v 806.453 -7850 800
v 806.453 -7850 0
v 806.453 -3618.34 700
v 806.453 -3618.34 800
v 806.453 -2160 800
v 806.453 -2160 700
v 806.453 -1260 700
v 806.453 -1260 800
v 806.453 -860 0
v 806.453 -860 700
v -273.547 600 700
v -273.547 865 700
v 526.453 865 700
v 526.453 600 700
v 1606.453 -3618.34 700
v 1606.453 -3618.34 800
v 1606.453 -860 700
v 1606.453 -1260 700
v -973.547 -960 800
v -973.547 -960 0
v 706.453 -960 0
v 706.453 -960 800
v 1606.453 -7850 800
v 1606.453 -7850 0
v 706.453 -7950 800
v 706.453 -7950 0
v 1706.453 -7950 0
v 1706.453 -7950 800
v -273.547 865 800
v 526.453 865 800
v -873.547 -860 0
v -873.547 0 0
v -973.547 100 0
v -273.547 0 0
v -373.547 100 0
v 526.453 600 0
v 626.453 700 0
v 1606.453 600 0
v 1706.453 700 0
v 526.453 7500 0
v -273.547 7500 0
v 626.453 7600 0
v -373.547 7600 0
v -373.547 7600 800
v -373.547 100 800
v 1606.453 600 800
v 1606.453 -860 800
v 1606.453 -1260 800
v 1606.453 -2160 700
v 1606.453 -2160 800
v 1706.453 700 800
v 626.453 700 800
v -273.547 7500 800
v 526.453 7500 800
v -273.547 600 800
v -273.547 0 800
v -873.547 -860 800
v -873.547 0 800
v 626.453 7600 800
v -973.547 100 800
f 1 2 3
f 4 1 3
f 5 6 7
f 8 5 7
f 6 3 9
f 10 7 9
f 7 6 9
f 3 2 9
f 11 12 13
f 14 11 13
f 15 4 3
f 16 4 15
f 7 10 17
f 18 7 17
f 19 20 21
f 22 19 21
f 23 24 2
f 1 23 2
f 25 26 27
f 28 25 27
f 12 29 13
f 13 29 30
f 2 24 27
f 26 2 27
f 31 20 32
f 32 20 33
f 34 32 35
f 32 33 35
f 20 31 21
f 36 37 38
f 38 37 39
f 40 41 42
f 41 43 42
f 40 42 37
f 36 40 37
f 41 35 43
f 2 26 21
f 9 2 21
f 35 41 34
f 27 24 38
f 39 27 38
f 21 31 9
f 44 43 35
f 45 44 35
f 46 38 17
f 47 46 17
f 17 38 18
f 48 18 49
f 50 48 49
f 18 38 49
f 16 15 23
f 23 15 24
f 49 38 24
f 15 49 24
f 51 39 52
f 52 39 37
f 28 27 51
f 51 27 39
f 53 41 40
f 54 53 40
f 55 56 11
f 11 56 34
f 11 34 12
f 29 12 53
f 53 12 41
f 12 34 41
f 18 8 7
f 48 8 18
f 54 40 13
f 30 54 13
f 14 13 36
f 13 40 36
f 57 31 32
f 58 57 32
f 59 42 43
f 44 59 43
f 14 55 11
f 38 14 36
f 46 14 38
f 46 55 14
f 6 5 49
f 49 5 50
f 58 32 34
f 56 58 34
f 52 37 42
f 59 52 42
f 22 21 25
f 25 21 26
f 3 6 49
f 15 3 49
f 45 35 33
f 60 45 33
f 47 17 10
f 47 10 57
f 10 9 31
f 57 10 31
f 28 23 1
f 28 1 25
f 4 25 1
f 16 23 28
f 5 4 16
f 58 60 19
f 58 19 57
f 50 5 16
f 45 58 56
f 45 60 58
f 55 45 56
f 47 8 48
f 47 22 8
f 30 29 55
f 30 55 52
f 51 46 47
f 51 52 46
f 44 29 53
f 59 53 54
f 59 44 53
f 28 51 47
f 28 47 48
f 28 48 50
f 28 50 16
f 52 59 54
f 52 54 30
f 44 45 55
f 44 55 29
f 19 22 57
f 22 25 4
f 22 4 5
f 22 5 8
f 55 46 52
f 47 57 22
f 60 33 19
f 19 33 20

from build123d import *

# Parameters (mm, degrees)
SALIENTE_EXTRUIR1_DEPTH = 800
CROQUIS2_W              = 800
CROQUIS2_H              = 400
SALIENTE_EXTRUIR2_DEPTH = 100
CROQUIS3_W              = 800
CROQUIS3_H              = 1458.339782358
SALIENTE_EXTRUIR3_DEPTH = 100
CROQUIS4_W              = 800
CROQUIS4_H              = 265
SALIENTE_EXTRUIR4_DEPTH = 100


with BuildPart() as part:
    # Croquis1 → Saliente-Extruir1 (new body)
    with BuildSketch(Plane.XY):
        Polygon((1606.453179542, -7950), (1706.453179542, -7950), (1706.453179542, 99.648210299), (1706.453179542, 499.648210299), (1706.453179542, 599.648210299), (1706.453179542, 700), (626.453179542, 700), (626.453179542, 7600), (-373.546820458, 7600), (-373.546820458, 100), (-973.546820458, 100), (-973.546820458, -960), (706.453179542, -960), (706.453179542, -7950), align=None)
        Polygon((-273.546820458, 0), (-273.546820458, 7500), (526.453179542, 7500), (526.453179542, 600), (1606.453179542, 600), (1606.453179542, 499.648210299), (1606.453179542, 399.648210299), (1606.453179542, 0), (1606.453179542, -2193.685123034), (1606.453179542, -7850), (806.453179542, -7850), (806.453179542, -860), (-373.546820458, -860), (-873.546820458, -860), (-873.546820458, 0), align=None, mode=Mode.SUBTRACT)
    extrude(amount=SALIENTE_EXTRUIR1_DEPTH)

    # Croquis2 → Saliente-Extruir2 (add)
    with BuildSketch(Plane.XY.offset(800)):
        with Locations((1206.453179542, -1060)):
            Rectangle(CROQUIS2_W, CROQUIS2_H)
    extrude(amount=-SALIENTE_EXTRUIR2_DEPTH)

    # Croquis3 → Saliente-Extruir3 (add)
    with BuildSketch(Plane.XY.offset(800)):
        with Locations((1206.453179542, -2889.169891179)):
            Rectangle(CROQUIS3_W, CROQUIS3_H)
    extrude(amount=-SALIENTE_EXTRUIR3_DEPTH)

    # Croquis4 → Saliente-Extruir4 (add)
    with BuildSketch(Plane.XY.offset(800)):
        with Locations((126.453179542, 732.5)):
            Rectangle(CROQUIS4_W, CROQUIS4_H)
    extrude(amount=-SALIENTE_EXTRUIR4_DEPTH)


solid = part.part
